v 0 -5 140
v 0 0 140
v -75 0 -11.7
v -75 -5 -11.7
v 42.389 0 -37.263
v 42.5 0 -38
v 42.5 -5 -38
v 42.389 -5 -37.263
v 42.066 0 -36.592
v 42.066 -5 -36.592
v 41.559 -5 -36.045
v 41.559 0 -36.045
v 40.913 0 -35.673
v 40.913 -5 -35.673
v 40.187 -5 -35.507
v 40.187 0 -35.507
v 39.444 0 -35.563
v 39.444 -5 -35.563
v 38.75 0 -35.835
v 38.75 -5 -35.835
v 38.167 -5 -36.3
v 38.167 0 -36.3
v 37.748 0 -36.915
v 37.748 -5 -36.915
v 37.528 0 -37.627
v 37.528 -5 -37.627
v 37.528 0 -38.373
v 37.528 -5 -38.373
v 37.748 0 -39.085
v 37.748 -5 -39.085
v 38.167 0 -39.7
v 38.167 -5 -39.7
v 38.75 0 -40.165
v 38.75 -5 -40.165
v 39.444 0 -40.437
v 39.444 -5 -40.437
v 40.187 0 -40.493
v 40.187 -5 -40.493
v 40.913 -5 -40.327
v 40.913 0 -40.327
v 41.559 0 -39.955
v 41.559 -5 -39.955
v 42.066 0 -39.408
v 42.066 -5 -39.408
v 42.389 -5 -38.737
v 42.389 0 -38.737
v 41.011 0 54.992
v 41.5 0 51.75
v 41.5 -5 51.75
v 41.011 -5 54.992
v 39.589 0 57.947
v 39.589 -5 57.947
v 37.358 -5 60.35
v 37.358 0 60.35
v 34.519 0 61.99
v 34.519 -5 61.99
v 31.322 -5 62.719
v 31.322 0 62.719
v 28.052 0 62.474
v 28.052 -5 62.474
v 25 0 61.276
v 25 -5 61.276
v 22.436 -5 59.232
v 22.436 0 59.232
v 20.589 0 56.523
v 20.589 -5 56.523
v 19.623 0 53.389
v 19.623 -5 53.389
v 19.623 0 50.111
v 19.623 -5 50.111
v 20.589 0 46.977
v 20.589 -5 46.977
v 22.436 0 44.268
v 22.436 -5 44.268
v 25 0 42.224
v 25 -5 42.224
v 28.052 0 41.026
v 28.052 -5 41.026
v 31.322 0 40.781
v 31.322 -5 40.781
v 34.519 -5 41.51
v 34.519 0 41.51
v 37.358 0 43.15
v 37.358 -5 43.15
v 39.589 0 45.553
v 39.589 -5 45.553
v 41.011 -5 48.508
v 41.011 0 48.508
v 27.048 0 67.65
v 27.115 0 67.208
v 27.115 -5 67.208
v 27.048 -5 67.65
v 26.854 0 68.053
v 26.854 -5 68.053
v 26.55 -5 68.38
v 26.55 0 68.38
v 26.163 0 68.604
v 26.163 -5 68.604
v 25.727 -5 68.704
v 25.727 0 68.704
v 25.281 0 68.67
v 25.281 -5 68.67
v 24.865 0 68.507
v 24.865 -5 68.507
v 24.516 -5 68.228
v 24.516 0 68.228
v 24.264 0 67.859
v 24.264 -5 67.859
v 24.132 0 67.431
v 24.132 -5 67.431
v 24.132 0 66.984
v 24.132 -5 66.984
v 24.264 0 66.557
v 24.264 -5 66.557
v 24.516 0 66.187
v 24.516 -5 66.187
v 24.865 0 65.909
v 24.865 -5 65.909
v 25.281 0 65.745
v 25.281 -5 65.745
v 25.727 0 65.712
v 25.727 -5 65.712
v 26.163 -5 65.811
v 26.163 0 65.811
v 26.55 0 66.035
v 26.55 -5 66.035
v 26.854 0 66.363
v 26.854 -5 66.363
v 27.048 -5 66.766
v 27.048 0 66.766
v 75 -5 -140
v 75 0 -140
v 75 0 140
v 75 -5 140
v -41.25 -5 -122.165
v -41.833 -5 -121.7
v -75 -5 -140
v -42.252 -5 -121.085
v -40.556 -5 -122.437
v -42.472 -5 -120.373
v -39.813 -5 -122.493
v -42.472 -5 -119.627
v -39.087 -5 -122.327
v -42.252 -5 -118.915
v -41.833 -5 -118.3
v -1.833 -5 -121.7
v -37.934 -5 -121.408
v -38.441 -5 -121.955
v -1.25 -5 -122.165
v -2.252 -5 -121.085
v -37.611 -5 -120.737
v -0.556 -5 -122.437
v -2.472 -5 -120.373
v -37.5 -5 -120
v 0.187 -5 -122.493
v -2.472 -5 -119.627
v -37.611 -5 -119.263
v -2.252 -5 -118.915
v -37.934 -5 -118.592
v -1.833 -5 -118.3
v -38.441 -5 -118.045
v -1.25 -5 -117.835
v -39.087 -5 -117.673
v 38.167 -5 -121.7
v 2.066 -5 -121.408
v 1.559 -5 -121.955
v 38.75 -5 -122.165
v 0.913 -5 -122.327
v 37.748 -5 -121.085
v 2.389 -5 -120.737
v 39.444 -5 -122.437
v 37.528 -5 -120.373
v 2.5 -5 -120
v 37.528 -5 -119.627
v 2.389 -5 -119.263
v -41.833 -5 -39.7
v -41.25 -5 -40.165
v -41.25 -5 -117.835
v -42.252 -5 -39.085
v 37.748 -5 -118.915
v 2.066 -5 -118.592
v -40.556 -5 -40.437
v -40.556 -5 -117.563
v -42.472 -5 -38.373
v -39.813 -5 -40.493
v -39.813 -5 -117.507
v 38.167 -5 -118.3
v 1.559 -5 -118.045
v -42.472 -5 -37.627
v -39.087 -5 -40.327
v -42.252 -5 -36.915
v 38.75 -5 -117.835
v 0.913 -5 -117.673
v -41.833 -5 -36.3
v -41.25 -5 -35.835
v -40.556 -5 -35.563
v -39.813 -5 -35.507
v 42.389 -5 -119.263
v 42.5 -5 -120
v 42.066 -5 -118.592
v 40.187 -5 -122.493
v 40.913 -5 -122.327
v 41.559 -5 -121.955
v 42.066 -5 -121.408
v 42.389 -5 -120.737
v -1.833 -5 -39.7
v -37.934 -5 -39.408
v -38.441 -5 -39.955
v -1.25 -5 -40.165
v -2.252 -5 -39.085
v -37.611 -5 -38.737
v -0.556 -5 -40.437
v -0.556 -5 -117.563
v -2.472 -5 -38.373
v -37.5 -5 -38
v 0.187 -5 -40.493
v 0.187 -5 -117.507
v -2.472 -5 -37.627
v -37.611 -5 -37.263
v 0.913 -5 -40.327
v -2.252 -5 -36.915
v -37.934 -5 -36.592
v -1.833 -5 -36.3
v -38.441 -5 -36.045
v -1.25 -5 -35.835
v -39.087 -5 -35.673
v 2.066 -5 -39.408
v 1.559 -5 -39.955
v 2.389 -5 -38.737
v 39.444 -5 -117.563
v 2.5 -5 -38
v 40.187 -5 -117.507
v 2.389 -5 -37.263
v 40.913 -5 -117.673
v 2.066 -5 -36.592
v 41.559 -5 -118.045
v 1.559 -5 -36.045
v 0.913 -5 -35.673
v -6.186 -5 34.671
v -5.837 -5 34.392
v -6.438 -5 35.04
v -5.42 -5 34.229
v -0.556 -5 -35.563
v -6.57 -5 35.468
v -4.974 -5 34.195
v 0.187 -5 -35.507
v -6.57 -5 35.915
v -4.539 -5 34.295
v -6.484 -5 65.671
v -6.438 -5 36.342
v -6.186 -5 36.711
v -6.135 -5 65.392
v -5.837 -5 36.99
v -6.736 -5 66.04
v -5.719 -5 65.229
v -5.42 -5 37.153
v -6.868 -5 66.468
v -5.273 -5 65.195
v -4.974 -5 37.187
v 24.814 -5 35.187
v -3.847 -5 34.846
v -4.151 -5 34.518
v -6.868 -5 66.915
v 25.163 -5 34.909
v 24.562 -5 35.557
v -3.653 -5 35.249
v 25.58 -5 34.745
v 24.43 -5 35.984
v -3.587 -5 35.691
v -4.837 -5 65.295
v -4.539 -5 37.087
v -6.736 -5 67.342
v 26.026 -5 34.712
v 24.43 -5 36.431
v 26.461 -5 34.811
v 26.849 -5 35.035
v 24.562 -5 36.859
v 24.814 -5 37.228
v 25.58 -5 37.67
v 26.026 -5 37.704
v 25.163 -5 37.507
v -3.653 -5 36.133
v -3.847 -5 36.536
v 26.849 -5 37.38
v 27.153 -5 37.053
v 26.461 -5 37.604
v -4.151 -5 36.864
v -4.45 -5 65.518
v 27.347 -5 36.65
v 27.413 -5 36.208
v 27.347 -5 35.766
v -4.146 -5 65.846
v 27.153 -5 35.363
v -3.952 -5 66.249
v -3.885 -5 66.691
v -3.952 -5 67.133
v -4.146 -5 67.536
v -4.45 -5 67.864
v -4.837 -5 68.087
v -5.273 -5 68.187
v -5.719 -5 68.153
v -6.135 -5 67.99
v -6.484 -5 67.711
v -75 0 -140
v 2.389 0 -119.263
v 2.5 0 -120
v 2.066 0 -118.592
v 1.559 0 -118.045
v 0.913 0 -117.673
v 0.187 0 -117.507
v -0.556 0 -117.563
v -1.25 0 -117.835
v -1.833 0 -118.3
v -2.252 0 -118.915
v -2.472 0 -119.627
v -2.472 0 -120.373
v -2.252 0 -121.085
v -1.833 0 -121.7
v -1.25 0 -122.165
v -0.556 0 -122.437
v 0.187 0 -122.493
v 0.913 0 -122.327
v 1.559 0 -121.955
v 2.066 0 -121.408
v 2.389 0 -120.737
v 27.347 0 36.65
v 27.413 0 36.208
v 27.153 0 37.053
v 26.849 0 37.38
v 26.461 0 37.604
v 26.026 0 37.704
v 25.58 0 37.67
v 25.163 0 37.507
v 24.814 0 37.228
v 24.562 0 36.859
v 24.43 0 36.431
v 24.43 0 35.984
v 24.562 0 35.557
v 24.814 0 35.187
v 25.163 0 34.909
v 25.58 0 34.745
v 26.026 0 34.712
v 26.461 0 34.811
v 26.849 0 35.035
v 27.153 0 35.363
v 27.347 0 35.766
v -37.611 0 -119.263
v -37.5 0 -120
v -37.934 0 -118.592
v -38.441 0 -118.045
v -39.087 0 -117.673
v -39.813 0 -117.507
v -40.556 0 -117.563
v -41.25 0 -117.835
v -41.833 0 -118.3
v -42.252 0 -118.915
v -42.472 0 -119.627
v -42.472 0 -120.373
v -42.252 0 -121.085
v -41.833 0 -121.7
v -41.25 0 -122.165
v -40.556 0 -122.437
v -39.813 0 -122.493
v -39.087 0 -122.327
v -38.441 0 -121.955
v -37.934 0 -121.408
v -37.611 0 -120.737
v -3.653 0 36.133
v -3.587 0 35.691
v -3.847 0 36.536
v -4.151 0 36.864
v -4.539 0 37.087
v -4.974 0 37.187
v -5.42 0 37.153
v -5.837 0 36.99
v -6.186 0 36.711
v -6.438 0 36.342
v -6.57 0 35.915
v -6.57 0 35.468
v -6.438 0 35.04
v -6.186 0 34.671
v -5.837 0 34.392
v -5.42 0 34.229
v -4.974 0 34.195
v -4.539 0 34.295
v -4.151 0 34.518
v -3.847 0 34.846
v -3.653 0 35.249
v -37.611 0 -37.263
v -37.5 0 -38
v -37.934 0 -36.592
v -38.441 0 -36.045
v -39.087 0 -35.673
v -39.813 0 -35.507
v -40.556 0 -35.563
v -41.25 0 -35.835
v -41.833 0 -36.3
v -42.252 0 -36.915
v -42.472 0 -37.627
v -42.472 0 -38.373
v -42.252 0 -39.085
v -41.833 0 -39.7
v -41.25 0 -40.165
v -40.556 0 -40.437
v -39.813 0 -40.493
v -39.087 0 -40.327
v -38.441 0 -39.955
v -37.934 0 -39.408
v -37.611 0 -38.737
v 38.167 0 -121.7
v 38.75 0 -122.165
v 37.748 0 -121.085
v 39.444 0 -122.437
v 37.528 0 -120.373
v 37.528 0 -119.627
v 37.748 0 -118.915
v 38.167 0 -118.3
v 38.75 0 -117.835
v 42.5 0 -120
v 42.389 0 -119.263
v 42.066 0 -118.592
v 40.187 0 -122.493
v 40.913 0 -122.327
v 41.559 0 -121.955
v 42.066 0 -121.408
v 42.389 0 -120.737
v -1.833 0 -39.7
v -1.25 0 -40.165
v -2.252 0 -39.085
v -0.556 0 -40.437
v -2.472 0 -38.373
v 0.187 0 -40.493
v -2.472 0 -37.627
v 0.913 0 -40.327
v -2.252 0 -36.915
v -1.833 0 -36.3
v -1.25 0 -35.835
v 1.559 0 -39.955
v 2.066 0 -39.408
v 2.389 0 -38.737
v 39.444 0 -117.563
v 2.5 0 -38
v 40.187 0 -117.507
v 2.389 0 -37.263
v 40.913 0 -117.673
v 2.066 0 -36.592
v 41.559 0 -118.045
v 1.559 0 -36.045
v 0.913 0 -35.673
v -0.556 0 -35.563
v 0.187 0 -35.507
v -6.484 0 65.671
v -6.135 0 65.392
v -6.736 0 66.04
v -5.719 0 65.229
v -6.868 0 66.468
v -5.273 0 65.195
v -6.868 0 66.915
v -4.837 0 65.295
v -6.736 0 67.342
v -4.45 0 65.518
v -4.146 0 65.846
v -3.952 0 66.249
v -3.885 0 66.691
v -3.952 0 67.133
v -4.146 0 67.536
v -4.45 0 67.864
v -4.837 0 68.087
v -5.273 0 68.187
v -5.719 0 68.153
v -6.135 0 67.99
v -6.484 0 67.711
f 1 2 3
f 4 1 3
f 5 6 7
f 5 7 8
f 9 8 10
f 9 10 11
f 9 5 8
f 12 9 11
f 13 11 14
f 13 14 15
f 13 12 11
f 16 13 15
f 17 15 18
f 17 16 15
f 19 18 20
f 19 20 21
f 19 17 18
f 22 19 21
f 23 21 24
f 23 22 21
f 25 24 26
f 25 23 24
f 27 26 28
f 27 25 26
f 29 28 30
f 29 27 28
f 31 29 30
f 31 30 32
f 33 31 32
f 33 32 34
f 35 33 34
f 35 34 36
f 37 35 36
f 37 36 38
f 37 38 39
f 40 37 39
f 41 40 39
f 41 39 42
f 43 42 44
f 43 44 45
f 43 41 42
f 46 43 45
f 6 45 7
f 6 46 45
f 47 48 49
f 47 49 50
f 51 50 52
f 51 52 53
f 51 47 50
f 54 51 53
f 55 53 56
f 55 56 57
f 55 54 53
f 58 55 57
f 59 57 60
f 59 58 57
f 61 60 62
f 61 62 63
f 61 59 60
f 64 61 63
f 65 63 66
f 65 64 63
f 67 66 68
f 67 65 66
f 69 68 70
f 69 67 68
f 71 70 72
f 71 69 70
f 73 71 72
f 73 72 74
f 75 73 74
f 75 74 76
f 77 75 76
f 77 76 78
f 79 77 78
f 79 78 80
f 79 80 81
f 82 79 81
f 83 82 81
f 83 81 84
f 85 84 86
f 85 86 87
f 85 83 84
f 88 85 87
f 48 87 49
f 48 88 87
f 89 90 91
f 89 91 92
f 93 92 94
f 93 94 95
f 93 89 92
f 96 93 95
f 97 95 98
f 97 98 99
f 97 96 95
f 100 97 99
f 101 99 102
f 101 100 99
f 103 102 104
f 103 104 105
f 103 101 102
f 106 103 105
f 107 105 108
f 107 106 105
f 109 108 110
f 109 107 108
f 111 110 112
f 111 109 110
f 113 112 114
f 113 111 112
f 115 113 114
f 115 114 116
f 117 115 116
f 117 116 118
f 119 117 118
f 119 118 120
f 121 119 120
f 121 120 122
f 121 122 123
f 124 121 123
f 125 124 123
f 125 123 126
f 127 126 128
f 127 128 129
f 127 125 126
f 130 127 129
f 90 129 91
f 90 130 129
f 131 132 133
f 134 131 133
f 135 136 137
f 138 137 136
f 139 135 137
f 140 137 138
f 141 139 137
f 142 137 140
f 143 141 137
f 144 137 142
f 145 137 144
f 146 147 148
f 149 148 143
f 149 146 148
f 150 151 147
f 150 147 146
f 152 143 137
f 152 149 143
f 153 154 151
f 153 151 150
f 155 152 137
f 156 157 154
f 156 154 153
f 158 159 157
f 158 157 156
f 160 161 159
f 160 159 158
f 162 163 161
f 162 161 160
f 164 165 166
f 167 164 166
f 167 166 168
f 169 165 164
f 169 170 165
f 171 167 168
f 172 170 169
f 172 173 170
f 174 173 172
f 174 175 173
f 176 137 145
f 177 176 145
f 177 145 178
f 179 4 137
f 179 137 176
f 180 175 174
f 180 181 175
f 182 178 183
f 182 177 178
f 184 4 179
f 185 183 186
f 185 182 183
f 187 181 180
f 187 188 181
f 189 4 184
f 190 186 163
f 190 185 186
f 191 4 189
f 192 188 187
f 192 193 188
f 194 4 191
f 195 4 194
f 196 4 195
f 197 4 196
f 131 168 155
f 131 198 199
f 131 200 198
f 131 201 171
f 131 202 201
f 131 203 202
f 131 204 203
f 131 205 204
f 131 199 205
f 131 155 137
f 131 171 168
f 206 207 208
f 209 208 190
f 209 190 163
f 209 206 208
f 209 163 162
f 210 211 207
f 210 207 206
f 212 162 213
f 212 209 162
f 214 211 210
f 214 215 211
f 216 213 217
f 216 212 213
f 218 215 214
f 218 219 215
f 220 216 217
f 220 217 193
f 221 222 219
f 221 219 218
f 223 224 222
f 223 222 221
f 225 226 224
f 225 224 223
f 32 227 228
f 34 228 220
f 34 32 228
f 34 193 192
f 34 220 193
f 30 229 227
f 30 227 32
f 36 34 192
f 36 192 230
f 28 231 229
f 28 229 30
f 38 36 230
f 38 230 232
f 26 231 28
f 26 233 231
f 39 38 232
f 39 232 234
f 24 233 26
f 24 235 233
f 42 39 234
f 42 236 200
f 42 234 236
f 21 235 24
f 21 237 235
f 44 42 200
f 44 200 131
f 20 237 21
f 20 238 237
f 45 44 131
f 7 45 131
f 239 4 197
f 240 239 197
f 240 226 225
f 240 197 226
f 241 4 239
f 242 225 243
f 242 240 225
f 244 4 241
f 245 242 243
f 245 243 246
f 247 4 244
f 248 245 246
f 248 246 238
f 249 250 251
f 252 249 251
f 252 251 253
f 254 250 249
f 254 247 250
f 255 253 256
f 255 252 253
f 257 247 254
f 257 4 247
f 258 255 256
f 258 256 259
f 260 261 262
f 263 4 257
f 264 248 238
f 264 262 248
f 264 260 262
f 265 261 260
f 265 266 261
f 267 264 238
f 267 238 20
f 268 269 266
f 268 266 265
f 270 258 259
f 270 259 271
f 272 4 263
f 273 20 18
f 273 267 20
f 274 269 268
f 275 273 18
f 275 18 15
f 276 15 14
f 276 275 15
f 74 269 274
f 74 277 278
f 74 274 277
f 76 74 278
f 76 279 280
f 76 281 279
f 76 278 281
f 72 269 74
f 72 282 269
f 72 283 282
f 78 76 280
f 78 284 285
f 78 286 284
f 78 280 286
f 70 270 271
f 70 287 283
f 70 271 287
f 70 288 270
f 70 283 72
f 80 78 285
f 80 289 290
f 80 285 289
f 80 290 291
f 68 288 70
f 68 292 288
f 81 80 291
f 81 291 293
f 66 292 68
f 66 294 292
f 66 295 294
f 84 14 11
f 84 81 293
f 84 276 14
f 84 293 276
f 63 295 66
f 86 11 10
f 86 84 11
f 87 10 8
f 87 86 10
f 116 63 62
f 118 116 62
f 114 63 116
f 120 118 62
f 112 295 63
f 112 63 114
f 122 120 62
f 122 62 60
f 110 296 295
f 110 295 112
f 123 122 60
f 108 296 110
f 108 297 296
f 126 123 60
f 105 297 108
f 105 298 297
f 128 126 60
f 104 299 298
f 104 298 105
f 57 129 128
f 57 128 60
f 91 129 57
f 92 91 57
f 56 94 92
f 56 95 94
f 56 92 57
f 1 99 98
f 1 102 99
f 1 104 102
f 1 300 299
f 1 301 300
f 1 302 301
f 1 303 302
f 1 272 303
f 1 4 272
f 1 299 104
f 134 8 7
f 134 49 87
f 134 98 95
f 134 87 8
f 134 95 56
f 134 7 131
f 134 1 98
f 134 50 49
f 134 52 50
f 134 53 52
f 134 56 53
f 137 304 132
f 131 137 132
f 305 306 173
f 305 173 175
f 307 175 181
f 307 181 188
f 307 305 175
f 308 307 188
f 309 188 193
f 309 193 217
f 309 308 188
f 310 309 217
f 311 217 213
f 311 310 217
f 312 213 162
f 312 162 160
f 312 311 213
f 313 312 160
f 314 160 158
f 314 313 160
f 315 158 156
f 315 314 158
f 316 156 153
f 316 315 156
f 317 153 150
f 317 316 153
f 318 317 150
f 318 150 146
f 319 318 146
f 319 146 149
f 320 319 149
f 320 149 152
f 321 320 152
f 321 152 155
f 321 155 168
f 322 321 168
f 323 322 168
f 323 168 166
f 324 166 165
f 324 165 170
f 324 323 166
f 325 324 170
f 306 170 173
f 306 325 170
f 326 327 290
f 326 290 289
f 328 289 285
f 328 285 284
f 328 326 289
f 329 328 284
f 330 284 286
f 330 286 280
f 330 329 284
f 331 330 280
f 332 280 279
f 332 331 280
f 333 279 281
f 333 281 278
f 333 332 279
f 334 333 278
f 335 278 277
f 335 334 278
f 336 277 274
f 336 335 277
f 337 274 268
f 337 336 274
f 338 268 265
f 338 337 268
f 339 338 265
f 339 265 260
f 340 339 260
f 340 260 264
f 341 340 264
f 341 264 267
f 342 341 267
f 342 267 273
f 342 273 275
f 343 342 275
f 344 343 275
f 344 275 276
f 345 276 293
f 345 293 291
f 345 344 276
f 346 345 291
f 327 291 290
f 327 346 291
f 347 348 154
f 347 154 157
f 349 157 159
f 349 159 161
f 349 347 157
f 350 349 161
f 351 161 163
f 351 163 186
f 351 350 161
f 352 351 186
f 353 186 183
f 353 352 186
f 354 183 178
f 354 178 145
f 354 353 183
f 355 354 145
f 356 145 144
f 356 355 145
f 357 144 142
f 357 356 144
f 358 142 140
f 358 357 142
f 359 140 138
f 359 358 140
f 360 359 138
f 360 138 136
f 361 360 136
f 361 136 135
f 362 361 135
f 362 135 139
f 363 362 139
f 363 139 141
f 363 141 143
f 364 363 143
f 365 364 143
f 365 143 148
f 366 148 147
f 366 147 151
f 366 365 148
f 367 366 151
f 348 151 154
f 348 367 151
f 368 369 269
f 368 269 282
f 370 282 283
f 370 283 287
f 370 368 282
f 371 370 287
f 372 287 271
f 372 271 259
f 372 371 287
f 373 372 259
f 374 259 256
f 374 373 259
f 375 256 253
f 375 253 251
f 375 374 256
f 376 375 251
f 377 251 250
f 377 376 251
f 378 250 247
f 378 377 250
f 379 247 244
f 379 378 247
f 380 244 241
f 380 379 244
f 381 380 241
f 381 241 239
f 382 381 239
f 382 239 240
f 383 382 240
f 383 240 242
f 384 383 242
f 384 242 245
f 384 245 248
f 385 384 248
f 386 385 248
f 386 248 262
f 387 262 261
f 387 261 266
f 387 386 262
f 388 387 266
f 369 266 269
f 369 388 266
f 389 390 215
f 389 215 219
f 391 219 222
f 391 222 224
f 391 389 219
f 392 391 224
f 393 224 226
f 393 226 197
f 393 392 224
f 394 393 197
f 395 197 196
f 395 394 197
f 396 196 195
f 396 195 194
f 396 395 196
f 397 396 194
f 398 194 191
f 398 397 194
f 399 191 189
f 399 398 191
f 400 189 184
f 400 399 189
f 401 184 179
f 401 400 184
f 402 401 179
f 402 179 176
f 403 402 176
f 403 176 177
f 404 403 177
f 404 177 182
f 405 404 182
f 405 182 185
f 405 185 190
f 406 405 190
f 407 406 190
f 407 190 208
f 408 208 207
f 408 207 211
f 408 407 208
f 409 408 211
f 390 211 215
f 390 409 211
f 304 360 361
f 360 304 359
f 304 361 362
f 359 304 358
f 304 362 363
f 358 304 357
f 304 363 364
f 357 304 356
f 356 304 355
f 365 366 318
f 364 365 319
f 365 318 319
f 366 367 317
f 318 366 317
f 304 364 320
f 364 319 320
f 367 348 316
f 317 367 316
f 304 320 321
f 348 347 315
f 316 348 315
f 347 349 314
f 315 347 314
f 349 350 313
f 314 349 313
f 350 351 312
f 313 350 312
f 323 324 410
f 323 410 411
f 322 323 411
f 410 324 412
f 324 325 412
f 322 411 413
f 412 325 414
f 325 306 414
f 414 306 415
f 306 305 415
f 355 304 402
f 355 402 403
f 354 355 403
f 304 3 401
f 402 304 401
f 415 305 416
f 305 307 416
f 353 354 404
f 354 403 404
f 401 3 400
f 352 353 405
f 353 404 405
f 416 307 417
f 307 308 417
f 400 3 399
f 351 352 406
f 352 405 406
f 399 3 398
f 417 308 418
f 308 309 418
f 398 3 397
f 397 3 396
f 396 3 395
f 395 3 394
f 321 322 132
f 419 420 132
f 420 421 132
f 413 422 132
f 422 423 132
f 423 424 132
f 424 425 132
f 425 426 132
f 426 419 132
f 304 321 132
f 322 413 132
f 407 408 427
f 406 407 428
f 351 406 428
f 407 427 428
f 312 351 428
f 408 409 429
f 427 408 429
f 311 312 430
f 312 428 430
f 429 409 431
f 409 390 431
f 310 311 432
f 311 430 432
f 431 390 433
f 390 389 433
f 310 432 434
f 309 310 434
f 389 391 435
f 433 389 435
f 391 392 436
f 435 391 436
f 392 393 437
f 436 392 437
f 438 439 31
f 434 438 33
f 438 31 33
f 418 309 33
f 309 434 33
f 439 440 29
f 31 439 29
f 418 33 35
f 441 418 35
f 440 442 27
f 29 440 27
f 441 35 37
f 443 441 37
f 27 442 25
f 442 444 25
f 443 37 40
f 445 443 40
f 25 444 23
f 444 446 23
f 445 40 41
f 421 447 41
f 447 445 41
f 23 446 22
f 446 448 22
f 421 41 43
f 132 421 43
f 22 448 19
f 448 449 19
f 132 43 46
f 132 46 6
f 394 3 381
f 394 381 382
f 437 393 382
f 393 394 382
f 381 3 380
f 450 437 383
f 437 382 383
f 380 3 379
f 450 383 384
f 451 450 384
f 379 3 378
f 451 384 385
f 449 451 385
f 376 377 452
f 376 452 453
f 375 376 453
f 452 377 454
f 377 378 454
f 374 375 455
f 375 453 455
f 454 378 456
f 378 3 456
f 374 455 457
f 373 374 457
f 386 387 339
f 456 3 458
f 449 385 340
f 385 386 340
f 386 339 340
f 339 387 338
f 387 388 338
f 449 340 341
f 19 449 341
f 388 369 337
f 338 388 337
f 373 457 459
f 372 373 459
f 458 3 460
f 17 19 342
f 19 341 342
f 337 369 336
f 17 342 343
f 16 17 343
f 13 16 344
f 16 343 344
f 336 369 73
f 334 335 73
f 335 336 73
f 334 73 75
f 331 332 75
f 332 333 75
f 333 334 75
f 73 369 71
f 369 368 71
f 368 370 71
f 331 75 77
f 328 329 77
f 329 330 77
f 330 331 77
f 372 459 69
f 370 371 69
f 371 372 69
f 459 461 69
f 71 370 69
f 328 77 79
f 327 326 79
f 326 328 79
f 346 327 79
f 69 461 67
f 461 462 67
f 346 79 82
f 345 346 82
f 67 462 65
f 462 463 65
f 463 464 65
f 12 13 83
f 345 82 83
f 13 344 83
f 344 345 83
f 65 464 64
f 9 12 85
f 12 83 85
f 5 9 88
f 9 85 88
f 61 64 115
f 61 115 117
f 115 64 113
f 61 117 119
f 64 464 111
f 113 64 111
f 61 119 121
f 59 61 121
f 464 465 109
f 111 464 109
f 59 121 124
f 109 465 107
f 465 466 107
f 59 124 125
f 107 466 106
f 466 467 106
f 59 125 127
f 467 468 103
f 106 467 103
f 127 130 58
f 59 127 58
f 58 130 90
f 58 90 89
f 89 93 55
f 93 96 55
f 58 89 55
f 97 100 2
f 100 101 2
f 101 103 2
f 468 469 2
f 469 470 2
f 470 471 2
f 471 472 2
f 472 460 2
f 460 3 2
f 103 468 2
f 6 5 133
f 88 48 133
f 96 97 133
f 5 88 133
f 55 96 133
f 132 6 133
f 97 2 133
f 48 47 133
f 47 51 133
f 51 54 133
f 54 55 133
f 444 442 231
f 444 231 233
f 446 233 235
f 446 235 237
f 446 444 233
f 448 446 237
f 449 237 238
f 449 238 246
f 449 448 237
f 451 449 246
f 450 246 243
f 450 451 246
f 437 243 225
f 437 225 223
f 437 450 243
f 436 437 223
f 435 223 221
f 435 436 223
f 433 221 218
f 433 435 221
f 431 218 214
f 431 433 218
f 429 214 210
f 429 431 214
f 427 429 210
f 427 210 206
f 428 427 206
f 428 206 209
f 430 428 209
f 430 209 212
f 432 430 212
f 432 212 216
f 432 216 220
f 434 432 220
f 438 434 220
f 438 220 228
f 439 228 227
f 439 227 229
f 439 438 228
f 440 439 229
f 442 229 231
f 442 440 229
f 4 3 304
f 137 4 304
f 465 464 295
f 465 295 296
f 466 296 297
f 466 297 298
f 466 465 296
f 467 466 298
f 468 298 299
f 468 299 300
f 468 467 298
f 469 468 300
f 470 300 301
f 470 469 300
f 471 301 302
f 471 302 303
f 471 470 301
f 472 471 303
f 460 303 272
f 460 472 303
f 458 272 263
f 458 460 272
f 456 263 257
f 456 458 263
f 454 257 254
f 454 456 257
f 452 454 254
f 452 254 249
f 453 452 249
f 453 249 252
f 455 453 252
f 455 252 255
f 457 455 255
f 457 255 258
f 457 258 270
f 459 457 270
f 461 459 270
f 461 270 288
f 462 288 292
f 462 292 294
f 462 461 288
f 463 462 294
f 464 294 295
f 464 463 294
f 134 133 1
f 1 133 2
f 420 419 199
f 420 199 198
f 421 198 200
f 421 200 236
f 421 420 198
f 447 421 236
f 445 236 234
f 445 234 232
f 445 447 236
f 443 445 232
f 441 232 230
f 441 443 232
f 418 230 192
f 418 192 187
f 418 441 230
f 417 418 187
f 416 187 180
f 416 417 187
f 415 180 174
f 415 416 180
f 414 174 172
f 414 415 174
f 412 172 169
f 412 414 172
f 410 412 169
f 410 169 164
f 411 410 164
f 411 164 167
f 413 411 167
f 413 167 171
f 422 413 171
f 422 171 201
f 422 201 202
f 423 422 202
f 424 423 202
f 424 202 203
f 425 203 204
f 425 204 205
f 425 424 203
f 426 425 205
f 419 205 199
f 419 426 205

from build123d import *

# Parameters (mm, degrees)
F0_R     = 2.5
F0_R_2   = 1.5
F0_R_3   = 11
F1_DEPTH = 5


with BuildPart() as f1:
    # F0 (on Front) → F1 (new body)
    with BuildSketch(Plane.XZ):
        Polygon((-75, -140), (75, -140), (75, 140), (0, 140), (-75, -11.7), align=None)
        with Locations((-40, -120)):
            Circle(F0_R, mode=Mode.SUBTRACT)
        with Locations((-40, -38)):
            Circle(F0_R, mode=Mode.SUBTRACT)
        with Locations((0, -120)):
            Circle(F0_R, mode=Mode.SUBTRACT)
        with Locations((40, -120)):
            Circle(F0_R, mode=Mode.SUBTRACT)
        with Locations((0, -38)):
            Circle(F0_R, mode=Mode.SUBTRACT)
        with Locations((40, -38)):
            Circle(F0_R, mode=Mode.SUBTRACT)
        with Locations((-5.086579, 35.691086)):
            Circle(F0_R_2, mode=Mode.SUBTRACT)
        with Locations((-5.384895, 66.691086)):
            Circle(F0_R_2, mode=Mode.SUBTRACT)
        with Locations((25.913421, 36.207732)):
            Circle(F0_R_2, mode=Mode.SUBTRACT)
        with Locations((30.5, 51.75)):
            Circle(F0_R_3, mode=Mode.SUBTRACT)
        with Locations((25.615105, 67.207732)):
            Circle(F0_R_2, mode=Mode.SUBTRACT)
    extrude(amount=F1_DEPTH)


solid = f1.part
